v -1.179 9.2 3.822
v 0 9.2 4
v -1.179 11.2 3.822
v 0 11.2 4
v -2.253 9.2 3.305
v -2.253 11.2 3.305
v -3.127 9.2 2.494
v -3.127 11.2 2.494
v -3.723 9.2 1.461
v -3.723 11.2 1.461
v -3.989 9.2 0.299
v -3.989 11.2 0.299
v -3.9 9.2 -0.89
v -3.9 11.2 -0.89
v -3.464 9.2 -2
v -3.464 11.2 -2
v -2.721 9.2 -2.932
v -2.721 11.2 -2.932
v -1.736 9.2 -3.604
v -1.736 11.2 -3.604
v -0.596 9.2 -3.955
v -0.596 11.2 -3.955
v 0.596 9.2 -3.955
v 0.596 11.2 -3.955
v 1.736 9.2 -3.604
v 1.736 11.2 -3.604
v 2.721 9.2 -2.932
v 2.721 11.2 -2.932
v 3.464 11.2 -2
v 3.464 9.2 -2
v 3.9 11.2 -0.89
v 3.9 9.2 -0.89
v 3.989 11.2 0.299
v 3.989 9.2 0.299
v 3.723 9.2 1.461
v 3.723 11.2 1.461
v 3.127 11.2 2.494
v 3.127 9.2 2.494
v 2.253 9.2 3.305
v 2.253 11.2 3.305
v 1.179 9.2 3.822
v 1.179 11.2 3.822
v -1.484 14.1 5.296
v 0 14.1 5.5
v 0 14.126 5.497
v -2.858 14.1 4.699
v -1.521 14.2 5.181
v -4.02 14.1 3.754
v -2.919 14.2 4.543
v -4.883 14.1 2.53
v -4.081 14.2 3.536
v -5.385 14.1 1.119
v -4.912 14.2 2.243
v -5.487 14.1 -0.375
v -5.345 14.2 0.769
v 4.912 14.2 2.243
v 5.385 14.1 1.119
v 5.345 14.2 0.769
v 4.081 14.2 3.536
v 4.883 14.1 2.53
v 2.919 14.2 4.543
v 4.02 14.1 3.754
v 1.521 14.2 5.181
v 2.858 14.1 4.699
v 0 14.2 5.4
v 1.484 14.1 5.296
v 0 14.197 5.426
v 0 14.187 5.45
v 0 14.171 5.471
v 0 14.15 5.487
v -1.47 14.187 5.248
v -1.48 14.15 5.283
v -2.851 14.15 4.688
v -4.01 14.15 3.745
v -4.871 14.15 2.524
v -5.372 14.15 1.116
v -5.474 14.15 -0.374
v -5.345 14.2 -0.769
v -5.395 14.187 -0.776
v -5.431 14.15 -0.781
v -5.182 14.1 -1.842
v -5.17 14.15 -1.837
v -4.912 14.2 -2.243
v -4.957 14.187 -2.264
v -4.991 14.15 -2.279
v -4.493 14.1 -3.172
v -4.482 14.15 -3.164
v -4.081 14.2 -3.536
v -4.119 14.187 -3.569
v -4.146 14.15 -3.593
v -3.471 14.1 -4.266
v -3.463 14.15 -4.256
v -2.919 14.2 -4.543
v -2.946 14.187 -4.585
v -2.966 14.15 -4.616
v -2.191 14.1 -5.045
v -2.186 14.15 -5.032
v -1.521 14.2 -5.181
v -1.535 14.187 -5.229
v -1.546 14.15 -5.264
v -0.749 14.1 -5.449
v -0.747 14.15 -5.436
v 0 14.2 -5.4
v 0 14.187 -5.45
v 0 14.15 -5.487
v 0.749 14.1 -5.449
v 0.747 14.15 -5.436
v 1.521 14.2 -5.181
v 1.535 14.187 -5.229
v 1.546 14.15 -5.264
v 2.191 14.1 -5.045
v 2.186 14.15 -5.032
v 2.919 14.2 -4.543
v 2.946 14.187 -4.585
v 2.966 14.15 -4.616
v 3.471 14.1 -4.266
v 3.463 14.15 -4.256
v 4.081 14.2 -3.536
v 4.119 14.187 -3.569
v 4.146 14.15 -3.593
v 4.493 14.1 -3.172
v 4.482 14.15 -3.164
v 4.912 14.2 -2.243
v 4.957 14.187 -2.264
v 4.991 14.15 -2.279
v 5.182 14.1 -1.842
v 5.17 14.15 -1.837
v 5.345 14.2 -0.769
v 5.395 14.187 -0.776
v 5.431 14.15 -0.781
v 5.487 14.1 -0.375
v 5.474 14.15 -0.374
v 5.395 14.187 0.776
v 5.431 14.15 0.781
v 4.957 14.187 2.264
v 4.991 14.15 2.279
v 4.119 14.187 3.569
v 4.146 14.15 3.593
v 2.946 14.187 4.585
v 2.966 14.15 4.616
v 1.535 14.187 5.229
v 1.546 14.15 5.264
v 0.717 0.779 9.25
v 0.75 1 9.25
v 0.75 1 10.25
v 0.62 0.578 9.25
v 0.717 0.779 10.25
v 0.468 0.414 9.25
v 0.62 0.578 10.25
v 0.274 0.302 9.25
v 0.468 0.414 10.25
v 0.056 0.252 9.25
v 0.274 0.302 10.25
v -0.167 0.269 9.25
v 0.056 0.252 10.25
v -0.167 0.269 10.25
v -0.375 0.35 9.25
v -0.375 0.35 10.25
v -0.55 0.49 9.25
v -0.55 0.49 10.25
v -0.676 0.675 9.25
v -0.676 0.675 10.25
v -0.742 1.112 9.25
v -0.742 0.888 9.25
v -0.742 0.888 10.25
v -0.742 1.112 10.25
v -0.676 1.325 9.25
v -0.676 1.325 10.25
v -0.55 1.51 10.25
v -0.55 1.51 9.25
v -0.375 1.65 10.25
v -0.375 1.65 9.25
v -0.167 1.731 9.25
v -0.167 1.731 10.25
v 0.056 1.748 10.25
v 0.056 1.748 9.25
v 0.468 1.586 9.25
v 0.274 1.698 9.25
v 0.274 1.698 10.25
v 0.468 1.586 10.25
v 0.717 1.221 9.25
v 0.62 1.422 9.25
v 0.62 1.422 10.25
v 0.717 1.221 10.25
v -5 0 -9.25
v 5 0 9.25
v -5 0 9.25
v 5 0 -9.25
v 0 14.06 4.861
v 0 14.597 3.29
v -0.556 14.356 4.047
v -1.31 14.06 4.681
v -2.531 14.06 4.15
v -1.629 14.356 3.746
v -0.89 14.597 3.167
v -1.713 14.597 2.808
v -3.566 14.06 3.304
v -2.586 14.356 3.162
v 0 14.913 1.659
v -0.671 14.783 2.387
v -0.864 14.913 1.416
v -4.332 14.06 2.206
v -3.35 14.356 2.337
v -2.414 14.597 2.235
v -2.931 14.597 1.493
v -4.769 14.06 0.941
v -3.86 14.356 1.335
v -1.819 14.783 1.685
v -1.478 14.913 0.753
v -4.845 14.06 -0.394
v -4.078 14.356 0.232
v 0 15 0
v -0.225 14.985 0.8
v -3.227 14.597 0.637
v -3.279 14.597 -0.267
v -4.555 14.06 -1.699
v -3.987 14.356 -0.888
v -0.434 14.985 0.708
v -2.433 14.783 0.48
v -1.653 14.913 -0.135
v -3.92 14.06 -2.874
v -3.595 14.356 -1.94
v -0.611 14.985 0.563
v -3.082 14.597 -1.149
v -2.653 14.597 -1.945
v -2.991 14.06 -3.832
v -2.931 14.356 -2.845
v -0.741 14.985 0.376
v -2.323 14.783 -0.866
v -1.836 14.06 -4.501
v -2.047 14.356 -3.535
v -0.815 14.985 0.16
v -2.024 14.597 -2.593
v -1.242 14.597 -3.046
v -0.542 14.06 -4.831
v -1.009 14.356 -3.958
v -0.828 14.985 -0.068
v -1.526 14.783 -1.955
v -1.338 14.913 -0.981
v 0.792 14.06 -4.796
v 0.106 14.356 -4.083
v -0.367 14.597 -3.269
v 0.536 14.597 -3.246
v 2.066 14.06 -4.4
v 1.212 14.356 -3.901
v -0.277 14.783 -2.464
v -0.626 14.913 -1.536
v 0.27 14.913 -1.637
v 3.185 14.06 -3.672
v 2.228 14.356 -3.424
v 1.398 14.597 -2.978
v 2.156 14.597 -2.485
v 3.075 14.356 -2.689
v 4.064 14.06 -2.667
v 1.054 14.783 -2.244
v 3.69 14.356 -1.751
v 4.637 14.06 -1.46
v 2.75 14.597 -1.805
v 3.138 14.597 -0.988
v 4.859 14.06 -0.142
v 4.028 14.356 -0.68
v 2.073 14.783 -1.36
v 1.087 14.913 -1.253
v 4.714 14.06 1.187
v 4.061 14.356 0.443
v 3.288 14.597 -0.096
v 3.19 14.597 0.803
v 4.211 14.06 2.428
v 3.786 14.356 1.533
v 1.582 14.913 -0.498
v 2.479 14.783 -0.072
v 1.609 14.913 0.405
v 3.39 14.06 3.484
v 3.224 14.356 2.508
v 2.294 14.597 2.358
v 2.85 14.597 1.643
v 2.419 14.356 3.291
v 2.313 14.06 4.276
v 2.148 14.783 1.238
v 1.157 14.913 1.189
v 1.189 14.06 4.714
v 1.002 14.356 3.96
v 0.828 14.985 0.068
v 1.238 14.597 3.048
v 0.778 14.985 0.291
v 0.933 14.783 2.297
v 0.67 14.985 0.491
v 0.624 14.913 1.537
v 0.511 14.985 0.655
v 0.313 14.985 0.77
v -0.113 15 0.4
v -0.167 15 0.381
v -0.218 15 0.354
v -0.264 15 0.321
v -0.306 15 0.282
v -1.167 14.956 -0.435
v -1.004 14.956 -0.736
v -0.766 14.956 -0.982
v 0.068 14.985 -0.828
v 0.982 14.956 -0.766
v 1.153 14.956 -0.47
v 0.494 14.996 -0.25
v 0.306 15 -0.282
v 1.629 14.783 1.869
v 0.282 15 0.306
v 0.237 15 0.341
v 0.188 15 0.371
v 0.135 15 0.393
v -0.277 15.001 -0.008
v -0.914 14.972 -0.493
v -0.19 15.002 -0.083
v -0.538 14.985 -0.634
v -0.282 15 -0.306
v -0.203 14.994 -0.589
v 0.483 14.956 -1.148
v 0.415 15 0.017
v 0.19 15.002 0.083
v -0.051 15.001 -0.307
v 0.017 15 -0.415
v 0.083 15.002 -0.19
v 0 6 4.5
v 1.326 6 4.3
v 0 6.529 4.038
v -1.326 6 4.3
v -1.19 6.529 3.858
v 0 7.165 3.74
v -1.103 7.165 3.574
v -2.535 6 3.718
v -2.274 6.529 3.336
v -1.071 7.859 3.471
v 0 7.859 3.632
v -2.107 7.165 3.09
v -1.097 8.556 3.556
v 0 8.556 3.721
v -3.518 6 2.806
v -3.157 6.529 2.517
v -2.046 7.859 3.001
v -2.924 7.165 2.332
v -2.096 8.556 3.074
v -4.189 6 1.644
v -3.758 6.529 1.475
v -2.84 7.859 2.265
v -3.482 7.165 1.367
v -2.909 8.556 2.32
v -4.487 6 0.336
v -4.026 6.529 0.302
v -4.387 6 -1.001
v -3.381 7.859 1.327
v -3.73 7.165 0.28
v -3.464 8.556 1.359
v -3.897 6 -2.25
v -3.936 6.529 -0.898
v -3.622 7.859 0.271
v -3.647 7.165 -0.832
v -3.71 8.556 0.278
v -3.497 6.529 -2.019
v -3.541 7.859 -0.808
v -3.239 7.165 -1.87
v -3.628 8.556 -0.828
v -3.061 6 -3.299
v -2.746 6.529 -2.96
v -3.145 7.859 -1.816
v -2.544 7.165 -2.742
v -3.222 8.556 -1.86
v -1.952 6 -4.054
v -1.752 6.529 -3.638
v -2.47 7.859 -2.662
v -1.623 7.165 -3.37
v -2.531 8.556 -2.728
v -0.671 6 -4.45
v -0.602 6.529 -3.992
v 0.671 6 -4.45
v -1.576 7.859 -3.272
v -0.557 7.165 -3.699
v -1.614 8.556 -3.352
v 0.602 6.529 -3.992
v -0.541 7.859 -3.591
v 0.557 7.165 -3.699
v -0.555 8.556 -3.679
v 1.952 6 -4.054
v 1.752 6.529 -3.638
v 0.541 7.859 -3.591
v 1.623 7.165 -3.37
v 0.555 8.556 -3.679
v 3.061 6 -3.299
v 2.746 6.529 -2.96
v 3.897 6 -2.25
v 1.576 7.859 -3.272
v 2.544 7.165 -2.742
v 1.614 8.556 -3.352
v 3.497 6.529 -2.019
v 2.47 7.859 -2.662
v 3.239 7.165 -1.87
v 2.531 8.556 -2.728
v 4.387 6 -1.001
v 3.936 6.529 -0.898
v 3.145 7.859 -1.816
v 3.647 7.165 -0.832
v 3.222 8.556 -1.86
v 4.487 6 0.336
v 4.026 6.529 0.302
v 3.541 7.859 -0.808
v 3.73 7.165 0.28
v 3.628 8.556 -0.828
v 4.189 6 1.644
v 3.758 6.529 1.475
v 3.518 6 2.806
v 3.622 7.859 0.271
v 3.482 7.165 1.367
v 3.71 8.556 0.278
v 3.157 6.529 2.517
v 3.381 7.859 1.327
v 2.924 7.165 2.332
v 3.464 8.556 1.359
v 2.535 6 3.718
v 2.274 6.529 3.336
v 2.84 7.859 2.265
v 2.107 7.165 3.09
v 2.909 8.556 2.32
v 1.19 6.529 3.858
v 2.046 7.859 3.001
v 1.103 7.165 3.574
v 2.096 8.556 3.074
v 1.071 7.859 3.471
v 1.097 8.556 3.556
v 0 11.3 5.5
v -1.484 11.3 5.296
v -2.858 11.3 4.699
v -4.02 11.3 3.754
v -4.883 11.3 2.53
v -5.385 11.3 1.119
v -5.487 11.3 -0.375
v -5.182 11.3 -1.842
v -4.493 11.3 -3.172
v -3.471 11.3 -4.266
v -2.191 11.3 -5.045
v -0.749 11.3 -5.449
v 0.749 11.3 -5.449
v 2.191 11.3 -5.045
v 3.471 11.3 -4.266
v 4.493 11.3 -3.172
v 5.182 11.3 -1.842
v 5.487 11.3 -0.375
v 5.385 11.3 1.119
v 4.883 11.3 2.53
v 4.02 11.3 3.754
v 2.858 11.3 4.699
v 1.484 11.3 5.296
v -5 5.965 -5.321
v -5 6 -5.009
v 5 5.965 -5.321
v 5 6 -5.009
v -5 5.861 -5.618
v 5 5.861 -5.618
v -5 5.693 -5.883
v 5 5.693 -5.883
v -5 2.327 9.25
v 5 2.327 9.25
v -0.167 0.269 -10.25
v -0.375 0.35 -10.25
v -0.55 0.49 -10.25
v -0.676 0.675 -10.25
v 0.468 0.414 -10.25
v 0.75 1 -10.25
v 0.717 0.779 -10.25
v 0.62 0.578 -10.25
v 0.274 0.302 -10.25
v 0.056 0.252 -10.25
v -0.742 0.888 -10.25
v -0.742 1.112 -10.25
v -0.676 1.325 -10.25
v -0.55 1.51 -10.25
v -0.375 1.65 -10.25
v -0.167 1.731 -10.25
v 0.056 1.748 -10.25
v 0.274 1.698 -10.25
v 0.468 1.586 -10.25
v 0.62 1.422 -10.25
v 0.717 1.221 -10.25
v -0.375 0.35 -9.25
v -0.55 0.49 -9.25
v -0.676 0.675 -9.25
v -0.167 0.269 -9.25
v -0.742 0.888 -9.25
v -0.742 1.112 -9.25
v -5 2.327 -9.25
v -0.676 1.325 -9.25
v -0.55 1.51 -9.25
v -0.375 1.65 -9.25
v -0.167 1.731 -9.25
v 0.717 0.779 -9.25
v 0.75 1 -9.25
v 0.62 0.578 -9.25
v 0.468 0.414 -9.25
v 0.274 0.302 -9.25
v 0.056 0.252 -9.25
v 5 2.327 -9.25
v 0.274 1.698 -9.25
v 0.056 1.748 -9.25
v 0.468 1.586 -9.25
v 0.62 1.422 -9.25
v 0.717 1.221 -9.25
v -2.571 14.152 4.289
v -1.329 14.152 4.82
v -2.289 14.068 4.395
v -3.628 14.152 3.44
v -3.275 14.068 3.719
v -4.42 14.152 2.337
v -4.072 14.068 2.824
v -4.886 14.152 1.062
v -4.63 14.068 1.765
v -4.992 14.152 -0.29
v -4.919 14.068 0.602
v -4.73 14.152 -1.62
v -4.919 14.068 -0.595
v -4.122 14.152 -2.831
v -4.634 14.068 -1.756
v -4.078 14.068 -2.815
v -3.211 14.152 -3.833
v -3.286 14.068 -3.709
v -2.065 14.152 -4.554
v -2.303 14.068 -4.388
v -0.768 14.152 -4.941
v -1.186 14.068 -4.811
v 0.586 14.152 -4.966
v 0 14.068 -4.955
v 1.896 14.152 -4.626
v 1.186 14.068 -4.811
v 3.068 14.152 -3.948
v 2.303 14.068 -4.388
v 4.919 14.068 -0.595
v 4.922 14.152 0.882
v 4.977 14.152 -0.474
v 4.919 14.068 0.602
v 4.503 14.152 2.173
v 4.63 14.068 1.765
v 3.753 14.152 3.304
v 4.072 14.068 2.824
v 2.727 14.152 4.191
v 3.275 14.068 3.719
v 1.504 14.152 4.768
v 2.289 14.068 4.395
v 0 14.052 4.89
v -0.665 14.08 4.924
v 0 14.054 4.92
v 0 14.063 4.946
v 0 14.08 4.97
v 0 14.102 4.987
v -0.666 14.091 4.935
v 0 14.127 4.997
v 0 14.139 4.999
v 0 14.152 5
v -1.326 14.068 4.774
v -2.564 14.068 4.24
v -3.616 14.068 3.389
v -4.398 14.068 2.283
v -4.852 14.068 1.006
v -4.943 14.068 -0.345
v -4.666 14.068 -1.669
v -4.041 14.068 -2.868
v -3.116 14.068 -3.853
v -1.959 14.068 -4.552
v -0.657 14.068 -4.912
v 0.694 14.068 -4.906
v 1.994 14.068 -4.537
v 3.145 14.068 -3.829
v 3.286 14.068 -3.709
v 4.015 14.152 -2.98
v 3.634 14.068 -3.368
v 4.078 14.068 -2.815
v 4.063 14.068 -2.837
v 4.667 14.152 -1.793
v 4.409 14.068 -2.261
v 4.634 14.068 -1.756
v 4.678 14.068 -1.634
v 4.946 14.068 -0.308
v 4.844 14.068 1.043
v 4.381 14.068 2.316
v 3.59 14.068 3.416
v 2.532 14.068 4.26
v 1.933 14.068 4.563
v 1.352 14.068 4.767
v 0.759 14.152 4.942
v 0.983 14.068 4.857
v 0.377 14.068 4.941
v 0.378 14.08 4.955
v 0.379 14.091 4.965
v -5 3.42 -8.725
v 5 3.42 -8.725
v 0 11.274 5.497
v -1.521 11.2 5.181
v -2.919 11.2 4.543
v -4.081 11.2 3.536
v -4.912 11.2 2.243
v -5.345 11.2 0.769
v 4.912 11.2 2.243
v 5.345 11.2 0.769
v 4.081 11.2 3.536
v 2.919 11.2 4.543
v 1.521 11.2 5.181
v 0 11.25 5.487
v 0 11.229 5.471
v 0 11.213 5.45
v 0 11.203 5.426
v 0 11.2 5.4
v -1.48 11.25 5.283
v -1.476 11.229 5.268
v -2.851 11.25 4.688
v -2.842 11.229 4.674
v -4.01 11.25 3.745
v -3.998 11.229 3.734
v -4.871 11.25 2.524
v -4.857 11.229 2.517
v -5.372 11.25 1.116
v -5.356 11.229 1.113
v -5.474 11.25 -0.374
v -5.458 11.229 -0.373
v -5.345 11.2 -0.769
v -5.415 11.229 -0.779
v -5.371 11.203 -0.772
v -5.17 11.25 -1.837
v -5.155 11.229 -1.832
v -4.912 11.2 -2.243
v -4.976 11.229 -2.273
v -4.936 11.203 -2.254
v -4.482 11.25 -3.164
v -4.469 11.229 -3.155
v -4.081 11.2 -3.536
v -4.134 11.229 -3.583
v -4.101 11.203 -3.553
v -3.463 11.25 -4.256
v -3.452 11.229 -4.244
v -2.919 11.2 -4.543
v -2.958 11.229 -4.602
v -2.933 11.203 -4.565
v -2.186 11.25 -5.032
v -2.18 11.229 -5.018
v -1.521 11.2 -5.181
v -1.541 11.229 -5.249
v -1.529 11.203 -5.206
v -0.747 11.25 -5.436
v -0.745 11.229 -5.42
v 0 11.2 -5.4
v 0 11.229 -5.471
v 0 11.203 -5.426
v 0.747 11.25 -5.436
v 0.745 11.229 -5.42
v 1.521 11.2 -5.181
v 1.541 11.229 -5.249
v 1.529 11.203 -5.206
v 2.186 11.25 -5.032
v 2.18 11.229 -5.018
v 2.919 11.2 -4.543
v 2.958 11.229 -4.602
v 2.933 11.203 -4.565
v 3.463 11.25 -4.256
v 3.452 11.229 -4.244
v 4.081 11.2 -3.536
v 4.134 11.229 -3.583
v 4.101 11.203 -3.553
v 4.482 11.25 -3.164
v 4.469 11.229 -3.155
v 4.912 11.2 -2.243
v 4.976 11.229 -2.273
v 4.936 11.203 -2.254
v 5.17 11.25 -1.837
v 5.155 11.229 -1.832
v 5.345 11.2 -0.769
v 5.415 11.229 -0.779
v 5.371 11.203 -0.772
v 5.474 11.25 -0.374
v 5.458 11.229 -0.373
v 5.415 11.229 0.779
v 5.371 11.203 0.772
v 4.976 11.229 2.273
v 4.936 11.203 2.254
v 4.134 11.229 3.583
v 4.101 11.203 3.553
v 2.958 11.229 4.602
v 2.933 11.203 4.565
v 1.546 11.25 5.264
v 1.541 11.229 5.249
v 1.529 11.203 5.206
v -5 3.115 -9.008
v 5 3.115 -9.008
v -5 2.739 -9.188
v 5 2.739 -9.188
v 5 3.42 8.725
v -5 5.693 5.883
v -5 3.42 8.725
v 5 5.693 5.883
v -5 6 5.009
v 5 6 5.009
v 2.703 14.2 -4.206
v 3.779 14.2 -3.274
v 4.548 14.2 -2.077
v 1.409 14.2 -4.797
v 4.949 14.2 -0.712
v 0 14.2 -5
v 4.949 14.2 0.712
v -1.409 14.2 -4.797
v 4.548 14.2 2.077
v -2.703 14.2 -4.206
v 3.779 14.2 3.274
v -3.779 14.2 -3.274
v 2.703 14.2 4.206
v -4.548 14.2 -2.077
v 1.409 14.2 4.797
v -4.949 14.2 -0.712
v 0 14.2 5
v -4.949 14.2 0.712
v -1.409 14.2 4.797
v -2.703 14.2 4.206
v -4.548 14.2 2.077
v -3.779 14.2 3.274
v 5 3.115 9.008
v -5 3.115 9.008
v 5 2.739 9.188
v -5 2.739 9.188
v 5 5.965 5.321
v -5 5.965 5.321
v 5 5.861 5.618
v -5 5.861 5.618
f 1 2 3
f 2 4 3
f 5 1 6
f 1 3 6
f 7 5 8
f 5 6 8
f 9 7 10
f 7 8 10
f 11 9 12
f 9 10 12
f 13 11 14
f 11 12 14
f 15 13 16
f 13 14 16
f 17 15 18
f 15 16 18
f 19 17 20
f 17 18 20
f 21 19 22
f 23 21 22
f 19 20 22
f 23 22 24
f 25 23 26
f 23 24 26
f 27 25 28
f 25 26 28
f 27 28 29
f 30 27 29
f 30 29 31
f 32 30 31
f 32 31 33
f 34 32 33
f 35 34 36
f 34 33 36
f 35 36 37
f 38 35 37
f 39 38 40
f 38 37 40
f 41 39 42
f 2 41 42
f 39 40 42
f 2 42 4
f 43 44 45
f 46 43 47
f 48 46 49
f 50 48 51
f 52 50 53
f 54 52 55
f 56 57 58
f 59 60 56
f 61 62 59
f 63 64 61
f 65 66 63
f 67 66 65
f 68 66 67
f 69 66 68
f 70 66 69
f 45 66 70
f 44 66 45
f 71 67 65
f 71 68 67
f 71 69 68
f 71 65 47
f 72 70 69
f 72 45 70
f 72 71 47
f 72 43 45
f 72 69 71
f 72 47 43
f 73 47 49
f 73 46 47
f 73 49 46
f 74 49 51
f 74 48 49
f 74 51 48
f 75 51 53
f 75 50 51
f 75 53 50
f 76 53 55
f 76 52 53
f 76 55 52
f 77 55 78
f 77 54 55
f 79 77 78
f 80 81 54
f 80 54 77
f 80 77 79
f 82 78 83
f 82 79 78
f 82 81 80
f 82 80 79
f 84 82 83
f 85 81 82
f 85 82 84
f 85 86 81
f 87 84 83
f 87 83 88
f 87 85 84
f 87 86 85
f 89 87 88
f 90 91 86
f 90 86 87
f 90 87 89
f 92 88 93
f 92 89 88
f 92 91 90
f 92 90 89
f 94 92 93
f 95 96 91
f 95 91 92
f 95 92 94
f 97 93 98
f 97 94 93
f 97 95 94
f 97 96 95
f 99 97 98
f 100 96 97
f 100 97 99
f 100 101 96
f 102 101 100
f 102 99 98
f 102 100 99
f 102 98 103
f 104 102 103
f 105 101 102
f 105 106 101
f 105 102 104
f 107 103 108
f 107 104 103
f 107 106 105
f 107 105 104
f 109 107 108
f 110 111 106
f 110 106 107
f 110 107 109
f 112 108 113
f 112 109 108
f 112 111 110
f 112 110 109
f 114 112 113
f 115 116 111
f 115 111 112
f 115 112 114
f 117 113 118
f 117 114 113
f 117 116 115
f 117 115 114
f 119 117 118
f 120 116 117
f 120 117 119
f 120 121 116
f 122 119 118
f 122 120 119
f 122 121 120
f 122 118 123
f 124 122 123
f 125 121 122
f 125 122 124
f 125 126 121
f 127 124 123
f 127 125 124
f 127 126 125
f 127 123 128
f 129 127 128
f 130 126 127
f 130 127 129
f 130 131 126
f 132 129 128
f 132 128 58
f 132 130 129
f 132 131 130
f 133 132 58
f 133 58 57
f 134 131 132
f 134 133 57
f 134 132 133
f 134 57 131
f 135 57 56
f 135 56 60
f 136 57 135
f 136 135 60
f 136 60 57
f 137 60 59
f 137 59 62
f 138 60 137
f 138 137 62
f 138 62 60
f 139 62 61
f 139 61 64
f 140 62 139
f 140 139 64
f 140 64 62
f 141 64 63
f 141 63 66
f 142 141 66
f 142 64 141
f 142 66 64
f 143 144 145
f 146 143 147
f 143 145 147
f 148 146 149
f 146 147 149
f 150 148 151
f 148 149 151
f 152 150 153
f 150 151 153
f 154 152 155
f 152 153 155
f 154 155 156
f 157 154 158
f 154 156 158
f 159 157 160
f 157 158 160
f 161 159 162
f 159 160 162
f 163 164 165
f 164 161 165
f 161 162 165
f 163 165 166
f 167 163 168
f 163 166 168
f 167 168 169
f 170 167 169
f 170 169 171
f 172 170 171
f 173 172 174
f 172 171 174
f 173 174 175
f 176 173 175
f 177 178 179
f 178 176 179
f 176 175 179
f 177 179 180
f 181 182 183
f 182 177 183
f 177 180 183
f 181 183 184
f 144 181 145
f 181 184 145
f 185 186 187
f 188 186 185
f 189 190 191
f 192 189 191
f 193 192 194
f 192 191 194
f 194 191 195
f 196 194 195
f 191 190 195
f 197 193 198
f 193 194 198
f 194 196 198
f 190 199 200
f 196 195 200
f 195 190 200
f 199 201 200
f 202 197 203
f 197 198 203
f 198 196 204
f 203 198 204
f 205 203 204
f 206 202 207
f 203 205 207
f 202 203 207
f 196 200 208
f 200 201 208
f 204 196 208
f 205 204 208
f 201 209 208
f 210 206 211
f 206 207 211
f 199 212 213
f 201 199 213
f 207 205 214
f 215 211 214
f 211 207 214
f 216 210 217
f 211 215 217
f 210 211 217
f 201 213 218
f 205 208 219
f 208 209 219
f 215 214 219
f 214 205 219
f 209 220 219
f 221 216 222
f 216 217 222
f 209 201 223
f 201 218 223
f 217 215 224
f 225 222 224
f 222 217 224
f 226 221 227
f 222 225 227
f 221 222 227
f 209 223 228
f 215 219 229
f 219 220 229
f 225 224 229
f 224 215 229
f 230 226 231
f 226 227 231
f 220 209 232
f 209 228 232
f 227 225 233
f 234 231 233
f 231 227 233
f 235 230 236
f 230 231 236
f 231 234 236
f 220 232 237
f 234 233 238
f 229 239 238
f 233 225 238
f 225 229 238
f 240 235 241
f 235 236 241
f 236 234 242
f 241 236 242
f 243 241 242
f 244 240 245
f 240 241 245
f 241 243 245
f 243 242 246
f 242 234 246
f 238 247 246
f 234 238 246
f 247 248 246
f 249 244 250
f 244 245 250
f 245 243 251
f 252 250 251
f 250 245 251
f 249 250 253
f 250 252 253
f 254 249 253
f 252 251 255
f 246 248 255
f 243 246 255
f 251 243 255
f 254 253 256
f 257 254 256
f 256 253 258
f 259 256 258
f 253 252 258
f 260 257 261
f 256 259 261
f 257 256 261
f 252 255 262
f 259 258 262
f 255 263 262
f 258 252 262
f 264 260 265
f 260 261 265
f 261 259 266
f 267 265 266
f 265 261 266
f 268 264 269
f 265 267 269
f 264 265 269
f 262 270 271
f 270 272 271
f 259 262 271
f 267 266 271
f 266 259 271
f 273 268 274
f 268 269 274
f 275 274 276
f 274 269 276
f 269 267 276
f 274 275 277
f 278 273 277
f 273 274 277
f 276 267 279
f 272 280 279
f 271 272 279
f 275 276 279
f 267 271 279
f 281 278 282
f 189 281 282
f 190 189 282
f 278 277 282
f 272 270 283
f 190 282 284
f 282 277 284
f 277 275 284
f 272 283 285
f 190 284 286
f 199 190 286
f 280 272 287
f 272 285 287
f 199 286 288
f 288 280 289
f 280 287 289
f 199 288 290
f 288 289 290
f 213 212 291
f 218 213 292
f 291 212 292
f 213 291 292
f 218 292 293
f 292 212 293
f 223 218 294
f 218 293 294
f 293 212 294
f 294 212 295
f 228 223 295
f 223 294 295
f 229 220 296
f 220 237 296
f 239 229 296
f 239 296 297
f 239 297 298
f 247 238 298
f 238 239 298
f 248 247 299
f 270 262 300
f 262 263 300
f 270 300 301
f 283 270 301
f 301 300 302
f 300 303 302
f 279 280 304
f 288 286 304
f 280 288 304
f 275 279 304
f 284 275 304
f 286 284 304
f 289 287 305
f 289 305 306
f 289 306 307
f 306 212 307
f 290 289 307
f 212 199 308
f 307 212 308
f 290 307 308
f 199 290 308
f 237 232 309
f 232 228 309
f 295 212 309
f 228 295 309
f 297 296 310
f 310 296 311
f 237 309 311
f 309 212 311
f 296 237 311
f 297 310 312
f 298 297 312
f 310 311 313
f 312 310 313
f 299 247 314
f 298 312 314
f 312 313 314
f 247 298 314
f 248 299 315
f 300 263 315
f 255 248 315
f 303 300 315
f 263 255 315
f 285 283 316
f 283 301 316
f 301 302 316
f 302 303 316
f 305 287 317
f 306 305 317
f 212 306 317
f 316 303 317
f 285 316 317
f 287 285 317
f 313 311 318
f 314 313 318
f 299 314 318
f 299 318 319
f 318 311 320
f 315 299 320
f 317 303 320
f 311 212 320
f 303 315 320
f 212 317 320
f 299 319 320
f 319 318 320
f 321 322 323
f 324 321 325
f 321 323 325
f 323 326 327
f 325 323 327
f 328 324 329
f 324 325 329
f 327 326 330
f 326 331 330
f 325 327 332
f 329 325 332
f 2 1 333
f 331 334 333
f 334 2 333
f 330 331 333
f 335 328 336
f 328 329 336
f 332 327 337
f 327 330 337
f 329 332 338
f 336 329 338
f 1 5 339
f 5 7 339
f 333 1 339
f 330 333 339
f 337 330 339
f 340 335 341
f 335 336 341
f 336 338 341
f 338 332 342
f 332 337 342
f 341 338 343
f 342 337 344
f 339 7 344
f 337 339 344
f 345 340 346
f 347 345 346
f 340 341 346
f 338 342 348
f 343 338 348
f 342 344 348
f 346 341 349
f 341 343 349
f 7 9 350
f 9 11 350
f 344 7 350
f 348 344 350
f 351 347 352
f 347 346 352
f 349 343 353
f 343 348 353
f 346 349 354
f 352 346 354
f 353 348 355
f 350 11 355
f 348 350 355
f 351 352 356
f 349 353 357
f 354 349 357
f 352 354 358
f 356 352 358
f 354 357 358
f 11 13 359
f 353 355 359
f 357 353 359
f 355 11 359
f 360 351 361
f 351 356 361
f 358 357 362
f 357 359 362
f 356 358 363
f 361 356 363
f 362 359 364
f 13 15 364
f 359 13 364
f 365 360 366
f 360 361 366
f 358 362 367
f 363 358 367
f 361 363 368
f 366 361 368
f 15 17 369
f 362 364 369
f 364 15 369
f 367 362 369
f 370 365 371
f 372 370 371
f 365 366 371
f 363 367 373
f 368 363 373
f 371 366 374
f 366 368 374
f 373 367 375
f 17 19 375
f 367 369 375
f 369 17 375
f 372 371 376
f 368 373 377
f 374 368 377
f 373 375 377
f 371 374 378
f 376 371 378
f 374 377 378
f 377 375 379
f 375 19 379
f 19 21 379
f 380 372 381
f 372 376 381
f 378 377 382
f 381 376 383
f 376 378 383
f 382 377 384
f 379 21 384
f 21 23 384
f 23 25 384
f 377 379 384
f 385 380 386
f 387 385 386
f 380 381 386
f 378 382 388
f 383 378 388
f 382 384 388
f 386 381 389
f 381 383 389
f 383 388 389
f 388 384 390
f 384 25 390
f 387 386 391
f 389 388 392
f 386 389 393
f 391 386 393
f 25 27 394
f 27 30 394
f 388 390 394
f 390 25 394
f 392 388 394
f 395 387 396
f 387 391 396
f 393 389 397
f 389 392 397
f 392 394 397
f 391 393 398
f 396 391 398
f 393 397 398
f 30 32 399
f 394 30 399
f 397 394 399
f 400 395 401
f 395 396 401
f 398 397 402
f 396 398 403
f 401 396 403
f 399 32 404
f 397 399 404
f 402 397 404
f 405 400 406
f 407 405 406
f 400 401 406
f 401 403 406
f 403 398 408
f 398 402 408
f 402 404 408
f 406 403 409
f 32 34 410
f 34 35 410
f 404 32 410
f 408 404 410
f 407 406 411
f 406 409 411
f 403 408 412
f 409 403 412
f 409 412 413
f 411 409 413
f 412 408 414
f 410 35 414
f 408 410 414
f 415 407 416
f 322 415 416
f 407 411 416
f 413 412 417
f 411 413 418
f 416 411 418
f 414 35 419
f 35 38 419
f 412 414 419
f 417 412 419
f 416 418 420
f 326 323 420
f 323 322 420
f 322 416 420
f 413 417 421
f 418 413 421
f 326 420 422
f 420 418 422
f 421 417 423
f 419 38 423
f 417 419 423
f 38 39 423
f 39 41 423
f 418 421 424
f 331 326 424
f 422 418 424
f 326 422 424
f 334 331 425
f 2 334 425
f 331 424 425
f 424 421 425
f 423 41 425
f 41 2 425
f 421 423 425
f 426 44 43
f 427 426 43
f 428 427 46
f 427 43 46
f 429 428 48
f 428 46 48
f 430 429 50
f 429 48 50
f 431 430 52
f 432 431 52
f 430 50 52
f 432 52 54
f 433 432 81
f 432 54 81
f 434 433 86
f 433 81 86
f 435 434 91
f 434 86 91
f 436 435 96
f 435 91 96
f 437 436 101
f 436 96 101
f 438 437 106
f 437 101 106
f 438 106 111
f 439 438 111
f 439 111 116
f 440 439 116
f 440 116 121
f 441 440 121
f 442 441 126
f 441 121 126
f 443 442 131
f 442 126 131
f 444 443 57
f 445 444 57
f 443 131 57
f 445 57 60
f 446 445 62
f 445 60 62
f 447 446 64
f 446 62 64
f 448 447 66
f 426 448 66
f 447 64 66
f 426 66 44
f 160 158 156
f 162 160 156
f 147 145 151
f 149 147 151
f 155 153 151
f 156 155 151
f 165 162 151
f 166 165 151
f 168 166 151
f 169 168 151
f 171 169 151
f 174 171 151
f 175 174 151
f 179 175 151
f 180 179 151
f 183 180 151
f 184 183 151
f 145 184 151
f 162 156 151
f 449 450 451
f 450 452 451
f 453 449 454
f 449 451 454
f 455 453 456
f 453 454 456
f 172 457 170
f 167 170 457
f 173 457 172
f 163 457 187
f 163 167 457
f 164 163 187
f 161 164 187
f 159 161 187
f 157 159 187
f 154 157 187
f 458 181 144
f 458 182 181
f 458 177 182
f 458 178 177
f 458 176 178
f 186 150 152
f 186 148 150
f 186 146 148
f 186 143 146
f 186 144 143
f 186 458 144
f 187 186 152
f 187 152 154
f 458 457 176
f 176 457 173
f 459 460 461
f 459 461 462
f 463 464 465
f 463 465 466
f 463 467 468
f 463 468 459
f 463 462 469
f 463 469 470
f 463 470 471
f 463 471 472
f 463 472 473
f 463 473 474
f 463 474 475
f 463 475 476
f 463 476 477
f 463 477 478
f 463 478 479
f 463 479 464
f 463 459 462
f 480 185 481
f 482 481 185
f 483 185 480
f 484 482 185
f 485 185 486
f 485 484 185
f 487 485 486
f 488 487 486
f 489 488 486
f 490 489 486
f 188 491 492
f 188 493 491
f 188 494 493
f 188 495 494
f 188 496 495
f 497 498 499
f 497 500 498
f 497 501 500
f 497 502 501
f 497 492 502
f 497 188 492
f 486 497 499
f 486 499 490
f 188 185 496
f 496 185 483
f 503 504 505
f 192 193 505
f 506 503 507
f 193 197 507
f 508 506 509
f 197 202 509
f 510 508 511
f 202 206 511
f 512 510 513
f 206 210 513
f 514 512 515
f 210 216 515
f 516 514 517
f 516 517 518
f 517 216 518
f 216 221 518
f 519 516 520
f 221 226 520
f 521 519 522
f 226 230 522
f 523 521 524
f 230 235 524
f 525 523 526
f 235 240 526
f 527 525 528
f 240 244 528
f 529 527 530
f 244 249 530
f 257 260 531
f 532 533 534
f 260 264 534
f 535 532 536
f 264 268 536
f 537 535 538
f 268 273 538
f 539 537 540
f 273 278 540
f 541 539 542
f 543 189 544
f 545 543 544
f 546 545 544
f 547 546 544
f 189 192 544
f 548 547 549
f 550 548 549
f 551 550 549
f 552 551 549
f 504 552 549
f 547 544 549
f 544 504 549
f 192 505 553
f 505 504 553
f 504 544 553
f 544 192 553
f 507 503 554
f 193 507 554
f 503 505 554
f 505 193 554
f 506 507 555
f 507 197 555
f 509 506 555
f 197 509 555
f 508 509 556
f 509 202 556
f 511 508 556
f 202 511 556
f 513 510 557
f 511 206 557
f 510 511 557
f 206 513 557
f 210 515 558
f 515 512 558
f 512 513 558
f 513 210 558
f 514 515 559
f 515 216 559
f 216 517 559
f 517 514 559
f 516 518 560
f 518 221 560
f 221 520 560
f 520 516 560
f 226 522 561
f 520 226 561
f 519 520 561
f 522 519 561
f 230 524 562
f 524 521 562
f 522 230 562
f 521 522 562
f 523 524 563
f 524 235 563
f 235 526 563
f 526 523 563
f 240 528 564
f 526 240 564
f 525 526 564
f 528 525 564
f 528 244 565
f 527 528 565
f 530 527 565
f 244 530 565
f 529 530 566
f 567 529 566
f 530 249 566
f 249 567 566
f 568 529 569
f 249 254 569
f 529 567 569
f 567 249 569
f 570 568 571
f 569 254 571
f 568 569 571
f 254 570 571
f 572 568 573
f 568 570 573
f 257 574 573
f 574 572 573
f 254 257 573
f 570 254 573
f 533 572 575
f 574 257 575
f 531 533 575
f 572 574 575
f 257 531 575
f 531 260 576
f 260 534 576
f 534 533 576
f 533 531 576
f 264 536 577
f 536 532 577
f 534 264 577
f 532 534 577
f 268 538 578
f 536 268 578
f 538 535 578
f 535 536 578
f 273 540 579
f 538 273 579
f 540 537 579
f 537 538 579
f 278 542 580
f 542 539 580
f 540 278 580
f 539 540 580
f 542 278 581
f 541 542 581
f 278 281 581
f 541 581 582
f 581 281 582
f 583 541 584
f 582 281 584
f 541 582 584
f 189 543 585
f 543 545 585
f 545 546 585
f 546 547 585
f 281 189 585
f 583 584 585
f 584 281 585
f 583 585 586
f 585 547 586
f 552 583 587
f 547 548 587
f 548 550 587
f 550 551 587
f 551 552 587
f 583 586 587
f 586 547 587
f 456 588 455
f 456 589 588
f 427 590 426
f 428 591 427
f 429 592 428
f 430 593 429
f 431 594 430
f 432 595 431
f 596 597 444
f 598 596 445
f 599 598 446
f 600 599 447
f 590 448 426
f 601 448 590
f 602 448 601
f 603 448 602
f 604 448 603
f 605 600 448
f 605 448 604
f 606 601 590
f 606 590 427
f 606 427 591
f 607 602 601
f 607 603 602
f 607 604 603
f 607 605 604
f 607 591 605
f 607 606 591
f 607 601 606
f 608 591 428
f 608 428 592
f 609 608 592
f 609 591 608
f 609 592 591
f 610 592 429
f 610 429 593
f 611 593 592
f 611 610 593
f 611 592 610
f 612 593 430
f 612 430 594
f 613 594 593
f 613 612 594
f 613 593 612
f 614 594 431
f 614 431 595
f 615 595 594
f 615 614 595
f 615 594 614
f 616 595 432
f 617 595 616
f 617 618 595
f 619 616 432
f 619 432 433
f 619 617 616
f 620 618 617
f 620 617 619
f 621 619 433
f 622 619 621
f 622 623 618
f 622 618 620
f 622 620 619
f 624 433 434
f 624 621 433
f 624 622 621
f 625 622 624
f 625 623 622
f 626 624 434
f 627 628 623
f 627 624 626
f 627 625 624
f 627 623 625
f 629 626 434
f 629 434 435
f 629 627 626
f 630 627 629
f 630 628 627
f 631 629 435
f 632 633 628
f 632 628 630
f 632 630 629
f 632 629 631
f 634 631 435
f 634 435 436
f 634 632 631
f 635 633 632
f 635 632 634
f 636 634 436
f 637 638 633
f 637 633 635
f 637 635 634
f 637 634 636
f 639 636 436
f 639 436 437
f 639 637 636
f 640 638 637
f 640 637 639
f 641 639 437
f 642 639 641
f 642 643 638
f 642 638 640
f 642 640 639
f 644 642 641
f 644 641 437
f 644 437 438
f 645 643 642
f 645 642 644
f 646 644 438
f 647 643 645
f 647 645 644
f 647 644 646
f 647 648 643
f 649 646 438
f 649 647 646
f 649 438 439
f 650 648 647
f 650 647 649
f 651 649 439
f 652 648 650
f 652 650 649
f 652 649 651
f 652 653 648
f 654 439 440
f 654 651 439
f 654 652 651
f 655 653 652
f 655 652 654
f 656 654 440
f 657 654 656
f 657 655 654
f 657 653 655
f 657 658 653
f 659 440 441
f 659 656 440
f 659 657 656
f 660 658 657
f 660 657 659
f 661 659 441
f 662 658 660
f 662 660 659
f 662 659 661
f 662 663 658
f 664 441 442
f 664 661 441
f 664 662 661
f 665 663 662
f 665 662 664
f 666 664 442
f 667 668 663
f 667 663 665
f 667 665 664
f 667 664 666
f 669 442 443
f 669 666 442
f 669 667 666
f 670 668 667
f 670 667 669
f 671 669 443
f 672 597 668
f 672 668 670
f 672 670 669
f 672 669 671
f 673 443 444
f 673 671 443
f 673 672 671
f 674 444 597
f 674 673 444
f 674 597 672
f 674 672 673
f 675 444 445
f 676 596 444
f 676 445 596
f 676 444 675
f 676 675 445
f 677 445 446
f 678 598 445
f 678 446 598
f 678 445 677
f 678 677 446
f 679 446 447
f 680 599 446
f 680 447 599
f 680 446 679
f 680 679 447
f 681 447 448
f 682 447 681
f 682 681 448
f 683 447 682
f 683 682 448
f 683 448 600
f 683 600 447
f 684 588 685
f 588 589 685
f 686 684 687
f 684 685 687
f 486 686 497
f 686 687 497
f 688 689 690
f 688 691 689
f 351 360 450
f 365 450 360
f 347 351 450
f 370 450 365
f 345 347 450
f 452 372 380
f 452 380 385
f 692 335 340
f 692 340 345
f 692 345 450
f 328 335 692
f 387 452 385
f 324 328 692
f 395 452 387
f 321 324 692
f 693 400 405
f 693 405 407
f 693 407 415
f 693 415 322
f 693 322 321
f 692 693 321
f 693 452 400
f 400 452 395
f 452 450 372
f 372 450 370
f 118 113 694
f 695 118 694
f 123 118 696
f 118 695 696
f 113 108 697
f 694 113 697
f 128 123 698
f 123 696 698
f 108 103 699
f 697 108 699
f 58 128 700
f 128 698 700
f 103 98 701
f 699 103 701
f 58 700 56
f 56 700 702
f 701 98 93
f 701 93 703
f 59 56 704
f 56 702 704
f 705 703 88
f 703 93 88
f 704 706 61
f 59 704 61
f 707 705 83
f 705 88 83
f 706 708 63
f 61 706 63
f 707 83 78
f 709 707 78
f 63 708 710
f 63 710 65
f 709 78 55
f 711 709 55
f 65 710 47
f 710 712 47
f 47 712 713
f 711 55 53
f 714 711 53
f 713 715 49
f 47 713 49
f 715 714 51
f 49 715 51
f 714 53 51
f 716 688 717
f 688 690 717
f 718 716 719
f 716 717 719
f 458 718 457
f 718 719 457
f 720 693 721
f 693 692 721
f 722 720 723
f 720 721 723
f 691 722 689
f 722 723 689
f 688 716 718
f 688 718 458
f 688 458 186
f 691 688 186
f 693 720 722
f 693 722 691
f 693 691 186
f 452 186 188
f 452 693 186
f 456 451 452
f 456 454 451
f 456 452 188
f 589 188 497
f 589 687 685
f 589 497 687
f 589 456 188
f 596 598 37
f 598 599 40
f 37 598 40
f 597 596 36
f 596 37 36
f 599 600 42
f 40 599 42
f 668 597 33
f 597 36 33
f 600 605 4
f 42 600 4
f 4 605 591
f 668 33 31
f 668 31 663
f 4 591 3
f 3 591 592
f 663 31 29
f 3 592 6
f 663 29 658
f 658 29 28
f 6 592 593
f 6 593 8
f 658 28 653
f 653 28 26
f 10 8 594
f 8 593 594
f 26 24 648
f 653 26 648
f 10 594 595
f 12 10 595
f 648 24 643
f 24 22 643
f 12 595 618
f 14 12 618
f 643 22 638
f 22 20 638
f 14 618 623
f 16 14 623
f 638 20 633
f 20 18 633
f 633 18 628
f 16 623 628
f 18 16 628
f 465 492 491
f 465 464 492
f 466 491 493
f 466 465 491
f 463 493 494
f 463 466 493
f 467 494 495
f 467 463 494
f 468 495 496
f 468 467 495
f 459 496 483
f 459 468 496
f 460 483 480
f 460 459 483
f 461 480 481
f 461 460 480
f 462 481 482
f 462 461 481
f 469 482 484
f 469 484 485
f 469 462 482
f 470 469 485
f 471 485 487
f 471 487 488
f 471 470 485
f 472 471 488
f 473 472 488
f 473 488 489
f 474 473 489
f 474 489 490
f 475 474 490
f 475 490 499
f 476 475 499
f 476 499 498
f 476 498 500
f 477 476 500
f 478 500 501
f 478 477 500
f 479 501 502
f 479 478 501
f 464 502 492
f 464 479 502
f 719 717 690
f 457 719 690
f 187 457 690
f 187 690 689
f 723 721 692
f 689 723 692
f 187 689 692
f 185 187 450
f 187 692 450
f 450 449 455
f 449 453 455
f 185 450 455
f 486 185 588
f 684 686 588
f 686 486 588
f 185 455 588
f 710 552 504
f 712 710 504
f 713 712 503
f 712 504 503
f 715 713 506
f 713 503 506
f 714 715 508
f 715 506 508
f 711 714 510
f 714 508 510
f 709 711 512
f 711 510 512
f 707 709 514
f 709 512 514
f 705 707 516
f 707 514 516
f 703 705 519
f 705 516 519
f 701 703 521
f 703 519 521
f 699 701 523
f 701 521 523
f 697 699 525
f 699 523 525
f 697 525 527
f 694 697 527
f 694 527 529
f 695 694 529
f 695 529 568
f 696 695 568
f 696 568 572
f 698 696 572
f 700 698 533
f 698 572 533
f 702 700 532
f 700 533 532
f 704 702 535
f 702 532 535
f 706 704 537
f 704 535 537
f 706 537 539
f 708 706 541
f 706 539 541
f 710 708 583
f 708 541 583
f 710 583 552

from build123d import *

# Parameters (mm, degrees)
BOSS_EXTRUDE1_DEPTH = 5
FILLET1_R           = 0.1
FILLET2_R           = 1.4
SKETCH4_R           = 0.75
BOSS_EXTRUDE2_DEPTH = 1


with BuildPart() as part:
    # Sketch1 → Boss-Extrude1 (new, symmetric)
    with BuildSketch(Plane(origin=(0, 0, 0), x_dir=(0, 0, -1), z_dir=(1, 0, 0))):
        Polygon((-9.25, 0), (9.25, 0), (9.25, 3), (5.5, 6), (-5.5, 6), (-9.25, 3), align=None)
    extrude(amount=BOSS_EXTRUDE1_DEPTH, both=True)

    # Sketch2 → Revolve1 (revolve)
    with BuildSketch(Plane(origin=(0, 0, 0), x_dir=(0, 0, -1), z_dir=(1, 0, 0)), mode=Mode.PRIVATE) as revolve1_sk:
        with BuildLine():
            Line((0, 14), (0, 6))
            Line((0, 6), (4.5, 6))
            ThreePointArc((4.5, 6), (3.661737334, 7.508083958), (4, 9.2))
            Line((4, 9.2), (4, 11.2))
            Line((4, 11.2), (5.5, 11.2))
            Line((5.5, 11.2), (5.5, 14.2))
            Line((5.5, 14.2), (5, 14.2))
            Line((5, 14.2), (5, 14))
            Line((5, 14), (0, 14))
        make_face()
    revolve(revolve1_sk.sketch.rotate(Axis((0, 14, 0), (0, -1, 0)), 180), axis=Axis((0, 14, 0), (0, -1, 0)))

    # Sketch3 → Revolve2 (revolve)
    with BuildSketch(Plane(origin=(0, 0, 0), x_dir=(0, 0, -1), z_dir=(1, 0, 0))):
        with BuildLine():
            Line((0, 15), (0, 14.2))
            Line((0, 14.2), (0, 14))
            Line((0, 14), (-5, 14))
            ThreePointArc((-5, 14), (-2.553728094, 14.768640471), (0, 15))
        make_face()
    revolve(axis=Axis((0, 15, 0), (0, -1, 0)))

    # Fillet1
    fillet1_edges = [part.edges().sort_by_distance(p)[0] for p in [
        (0, 14, -5),
        (0, 11.2, -5.5),
        (0, 14.2, -5.5),
    ]]
    fillet(fillet1_edges, radius=FILLET1_R)

    # Fillet2
    fillet2_edges = [part.edges().sort_by_distance(p)[0] for p in [
        (0, 3, 9.25),
        (0, 6, 5.5),
        (0, 6, -5.5),
        (0, 3, -9.25),
    ]]
    fillet(fillet2_edges, radius=FILLET2_R)

    # Sketch4 → Boss-Extrude2 (add, symmetric)
    with BuildSketch(Plane(origin=(0, 0, -9.25), x_dir=(-1, 0, 0), z_dir=(0, 0, -1))):
        with Locations(Location((0, 1, 0), (0, 0, 180))):
            Circle(SKETCH4_R)
    boss_extrude2 = extrude(amount=BOSS_EXTRUDE2_DEPTH, both=True)

    # Mirror1: Boss-Extrude2 across plane
    add(boss_extrude2.mirror(Plane.XY))


solid = part.part
